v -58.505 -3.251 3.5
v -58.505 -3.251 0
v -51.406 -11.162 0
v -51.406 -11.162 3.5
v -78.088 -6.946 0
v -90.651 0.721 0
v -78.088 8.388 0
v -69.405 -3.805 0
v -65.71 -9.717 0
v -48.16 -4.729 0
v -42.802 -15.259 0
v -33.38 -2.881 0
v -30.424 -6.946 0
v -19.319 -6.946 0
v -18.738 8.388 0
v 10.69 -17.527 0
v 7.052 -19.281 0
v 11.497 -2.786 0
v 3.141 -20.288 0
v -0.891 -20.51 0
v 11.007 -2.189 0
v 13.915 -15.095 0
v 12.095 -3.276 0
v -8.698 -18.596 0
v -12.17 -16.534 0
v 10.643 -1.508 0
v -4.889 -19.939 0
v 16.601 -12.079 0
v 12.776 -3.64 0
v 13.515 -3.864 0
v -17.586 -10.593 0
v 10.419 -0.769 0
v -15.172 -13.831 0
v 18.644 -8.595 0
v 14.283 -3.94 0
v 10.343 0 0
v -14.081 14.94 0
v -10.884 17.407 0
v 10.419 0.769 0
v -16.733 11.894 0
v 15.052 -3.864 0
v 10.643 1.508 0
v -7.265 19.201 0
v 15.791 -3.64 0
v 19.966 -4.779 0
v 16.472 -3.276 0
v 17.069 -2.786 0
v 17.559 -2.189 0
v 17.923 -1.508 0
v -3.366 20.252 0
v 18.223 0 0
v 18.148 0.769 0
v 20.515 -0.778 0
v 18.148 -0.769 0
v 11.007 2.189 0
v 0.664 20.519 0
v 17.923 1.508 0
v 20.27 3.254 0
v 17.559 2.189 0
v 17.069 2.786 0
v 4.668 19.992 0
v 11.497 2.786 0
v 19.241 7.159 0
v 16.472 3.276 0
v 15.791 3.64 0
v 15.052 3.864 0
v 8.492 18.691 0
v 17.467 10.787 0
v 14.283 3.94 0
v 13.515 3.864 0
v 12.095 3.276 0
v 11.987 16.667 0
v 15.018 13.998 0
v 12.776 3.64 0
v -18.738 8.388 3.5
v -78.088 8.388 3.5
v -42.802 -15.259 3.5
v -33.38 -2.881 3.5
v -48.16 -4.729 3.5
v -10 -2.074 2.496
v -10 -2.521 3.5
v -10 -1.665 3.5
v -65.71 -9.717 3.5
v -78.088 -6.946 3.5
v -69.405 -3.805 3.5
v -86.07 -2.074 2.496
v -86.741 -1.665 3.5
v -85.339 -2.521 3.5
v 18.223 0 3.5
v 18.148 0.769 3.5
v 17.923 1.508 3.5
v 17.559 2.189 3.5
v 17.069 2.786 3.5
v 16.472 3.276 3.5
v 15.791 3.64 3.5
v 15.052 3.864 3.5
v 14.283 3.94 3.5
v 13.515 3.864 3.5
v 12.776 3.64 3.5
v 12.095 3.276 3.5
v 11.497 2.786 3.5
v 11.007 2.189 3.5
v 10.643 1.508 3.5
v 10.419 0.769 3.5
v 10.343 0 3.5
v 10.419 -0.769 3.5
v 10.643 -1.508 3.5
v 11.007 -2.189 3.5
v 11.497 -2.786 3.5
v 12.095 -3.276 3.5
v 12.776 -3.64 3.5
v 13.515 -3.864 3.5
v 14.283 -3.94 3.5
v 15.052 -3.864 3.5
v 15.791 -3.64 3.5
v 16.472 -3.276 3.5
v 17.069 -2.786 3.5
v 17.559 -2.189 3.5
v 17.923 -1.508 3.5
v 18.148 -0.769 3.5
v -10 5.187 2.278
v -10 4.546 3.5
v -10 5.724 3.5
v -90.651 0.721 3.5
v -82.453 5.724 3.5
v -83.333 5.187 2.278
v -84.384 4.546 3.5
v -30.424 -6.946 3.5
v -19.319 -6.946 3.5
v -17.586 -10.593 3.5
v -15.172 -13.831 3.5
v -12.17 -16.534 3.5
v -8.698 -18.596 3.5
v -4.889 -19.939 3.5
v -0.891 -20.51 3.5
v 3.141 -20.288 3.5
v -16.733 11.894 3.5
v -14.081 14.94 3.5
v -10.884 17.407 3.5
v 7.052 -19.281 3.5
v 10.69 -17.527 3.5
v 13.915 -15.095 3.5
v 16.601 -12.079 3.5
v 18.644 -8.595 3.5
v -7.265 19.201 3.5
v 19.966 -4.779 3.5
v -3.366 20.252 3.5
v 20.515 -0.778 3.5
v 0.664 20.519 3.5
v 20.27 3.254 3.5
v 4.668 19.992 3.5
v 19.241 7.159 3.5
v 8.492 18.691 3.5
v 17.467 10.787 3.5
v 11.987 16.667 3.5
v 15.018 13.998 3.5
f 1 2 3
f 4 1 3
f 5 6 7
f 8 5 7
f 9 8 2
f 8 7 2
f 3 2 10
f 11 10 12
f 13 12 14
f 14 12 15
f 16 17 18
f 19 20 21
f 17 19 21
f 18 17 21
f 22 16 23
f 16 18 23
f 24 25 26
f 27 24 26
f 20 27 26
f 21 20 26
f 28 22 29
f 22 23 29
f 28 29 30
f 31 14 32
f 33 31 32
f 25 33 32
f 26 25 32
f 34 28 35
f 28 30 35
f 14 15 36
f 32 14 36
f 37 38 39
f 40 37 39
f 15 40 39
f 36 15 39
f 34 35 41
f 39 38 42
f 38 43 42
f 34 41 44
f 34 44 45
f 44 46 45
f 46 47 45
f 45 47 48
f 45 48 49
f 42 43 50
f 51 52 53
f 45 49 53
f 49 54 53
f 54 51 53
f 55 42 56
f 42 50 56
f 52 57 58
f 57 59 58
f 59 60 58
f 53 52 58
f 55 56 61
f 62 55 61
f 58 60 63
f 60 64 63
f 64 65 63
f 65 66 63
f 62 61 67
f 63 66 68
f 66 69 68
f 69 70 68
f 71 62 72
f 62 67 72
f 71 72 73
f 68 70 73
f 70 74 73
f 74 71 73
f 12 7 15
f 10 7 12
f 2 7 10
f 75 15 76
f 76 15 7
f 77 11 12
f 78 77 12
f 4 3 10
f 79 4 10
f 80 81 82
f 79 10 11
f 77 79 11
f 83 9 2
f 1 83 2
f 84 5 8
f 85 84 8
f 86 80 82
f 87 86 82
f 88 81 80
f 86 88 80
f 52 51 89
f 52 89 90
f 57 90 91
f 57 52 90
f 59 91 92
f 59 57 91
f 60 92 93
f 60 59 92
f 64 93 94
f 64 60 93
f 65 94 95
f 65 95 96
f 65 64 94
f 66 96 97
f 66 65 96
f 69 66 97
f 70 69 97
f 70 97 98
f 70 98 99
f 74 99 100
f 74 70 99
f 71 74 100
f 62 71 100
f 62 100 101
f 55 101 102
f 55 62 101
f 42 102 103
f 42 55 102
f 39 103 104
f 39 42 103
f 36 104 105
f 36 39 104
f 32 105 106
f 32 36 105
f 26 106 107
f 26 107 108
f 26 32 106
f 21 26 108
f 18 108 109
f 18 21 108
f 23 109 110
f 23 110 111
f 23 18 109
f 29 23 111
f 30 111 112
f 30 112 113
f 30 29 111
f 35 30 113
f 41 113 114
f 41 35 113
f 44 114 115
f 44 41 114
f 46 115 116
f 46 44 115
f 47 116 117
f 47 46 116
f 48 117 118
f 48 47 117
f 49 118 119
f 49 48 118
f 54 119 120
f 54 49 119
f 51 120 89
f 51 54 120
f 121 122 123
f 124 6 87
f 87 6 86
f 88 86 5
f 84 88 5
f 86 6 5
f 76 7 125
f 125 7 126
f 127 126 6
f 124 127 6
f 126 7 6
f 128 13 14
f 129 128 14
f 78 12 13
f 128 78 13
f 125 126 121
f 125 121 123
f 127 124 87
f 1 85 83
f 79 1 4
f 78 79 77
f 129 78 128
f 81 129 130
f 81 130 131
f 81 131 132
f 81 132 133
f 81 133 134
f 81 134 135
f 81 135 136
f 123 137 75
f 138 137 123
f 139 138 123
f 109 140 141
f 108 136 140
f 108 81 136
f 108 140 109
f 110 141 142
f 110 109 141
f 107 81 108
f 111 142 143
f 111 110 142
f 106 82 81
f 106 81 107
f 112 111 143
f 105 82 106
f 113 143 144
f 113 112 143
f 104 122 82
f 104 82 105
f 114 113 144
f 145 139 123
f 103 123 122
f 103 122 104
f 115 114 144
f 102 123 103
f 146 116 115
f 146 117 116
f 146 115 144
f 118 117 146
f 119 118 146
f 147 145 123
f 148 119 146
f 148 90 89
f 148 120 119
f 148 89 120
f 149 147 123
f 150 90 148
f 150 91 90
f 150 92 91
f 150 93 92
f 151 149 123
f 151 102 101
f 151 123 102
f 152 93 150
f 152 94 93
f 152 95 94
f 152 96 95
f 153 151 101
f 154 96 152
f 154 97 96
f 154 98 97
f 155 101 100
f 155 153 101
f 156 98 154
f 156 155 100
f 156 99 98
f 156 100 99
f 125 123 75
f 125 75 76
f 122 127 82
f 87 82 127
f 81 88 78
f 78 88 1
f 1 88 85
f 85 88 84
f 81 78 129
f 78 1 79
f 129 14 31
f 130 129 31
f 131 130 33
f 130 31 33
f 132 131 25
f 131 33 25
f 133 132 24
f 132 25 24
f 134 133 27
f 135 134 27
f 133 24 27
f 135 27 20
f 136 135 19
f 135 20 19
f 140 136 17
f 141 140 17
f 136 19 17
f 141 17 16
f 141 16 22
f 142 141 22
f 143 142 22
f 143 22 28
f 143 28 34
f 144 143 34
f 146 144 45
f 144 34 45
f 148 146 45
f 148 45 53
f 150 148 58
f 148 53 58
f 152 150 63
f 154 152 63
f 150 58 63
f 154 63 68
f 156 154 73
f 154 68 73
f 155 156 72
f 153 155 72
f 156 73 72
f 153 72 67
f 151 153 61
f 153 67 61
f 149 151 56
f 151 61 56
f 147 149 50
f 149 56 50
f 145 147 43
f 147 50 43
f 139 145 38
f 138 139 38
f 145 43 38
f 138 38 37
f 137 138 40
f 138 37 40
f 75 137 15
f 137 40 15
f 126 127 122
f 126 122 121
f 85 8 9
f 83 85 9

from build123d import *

# Parameters (mm, degrees)
F0_R     = 3.93993
F1_DEPTH = 3.5
F4_DEPTH = 150


with BuildPart() as f1:
    # F0 (on Top) → F1 (new body)
    with BuildSketch(Plane.XY):
        with BuildLine():
            Line((-30.424483, -6.945617), (-19.31924, -6.945617))
            ThreePointArc((-19.31924, -6.945617), (20.515116, -0.777576), (-18.738052, 8.388087))
            Line((-18.738052, 8.388087), (-78.088284, 8.388087))
            Line((-78.088284, 8.388087), (-90.650834, 0.721235))
            Line((-90.650834, 0.721235), (-78.088284, -6.945617))
            Line((-78.088284, -6.945617), (-69.405347, -3.804978))
            Line((-69.405347, -3.804978), (-65.710478, -9.716768))
            Line((-65.710478, -9.716768), (-58.505483, -3.250748))
            Line((-58.505483, -3.250748), (-51.40605, -11.161547))
            Line((-51.40605, -11.161547), (-48.159853, -4.728695))
            Line((-48.159853, -4.728695), (-42.802293, -15.259069))
            Line((-42.802293, -15.259069), (-33.380378, -2.881262))
            Line((-33.380378, -2.881262), (-30.424483, -6.945617))
        make_face()
        with Locations((14.283421, 0)):
            Circle(F0_R, mode=Mode.SUBTRACT)
    extrude(amount=F1_DEPTH)

    # F3 (on offset) → F4 (cut)
    with BuildSketch(Plane.YZ.offset(-10)):
        Polygon((5.187124, 2.278307), (6.987329, 6.371124), (2.650907, 7.108018), align=None)
        Polygon((-2.074363, 2.495993), (-0.437801, 6.506958), (-4.136456, 7.135476), align=None)
    extrude(amount=-F4_DEPTH, mode=Mode.SUBTRACT)


solid = f1.part
